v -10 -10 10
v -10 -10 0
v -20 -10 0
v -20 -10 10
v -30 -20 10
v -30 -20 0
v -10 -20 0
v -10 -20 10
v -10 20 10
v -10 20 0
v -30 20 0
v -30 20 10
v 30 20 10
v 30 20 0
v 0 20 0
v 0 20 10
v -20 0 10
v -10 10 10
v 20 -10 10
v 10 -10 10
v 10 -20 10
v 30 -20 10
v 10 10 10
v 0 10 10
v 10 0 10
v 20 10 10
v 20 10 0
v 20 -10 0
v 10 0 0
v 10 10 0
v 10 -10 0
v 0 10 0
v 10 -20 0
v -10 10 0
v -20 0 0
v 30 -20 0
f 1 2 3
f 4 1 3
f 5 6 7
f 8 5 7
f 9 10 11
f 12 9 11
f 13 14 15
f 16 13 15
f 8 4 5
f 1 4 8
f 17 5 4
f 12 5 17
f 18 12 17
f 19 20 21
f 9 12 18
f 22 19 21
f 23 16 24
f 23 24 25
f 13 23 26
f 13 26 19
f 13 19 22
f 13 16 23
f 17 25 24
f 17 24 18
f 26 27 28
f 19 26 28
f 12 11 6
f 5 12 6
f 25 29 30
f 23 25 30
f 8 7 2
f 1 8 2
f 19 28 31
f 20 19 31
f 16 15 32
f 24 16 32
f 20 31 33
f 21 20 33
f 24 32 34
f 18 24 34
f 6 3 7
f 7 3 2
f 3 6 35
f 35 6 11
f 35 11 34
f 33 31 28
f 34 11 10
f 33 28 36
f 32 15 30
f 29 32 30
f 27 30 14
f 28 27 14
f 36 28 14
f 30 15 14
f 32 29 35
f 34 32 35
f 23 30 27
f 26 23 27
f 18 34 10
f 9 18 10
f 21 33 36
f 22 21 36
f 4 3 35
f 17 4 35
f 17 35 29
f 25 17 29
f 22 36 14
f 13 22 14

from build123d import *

# Parameters (mm, degrees)
F1_DEPTH = 10


with BuildPart() as f1:
    # F0 (on Top) → F1 (new body)
    with BuildSketch(Plane.XY):
        Polygon((-10, 20), (-30, 20), (-30, -20), (-10, -20), (-10, -10), (-20, -10), (-20, 0), (-20, 10), (-10, 10), align=None)
        Polygon((30, 20), (0, 20), (0, 10), (10, 10), (20, 10), (20, -10), (10, -10), (10, -20), (30, -20), align=None)
        Polygon((0, 10), (-10, 10), (-20, 10), (-20, 0), (10, 0), (10, 10), align=None)
    extrude(amount=F1_DEPTH)


solid = f1.part
